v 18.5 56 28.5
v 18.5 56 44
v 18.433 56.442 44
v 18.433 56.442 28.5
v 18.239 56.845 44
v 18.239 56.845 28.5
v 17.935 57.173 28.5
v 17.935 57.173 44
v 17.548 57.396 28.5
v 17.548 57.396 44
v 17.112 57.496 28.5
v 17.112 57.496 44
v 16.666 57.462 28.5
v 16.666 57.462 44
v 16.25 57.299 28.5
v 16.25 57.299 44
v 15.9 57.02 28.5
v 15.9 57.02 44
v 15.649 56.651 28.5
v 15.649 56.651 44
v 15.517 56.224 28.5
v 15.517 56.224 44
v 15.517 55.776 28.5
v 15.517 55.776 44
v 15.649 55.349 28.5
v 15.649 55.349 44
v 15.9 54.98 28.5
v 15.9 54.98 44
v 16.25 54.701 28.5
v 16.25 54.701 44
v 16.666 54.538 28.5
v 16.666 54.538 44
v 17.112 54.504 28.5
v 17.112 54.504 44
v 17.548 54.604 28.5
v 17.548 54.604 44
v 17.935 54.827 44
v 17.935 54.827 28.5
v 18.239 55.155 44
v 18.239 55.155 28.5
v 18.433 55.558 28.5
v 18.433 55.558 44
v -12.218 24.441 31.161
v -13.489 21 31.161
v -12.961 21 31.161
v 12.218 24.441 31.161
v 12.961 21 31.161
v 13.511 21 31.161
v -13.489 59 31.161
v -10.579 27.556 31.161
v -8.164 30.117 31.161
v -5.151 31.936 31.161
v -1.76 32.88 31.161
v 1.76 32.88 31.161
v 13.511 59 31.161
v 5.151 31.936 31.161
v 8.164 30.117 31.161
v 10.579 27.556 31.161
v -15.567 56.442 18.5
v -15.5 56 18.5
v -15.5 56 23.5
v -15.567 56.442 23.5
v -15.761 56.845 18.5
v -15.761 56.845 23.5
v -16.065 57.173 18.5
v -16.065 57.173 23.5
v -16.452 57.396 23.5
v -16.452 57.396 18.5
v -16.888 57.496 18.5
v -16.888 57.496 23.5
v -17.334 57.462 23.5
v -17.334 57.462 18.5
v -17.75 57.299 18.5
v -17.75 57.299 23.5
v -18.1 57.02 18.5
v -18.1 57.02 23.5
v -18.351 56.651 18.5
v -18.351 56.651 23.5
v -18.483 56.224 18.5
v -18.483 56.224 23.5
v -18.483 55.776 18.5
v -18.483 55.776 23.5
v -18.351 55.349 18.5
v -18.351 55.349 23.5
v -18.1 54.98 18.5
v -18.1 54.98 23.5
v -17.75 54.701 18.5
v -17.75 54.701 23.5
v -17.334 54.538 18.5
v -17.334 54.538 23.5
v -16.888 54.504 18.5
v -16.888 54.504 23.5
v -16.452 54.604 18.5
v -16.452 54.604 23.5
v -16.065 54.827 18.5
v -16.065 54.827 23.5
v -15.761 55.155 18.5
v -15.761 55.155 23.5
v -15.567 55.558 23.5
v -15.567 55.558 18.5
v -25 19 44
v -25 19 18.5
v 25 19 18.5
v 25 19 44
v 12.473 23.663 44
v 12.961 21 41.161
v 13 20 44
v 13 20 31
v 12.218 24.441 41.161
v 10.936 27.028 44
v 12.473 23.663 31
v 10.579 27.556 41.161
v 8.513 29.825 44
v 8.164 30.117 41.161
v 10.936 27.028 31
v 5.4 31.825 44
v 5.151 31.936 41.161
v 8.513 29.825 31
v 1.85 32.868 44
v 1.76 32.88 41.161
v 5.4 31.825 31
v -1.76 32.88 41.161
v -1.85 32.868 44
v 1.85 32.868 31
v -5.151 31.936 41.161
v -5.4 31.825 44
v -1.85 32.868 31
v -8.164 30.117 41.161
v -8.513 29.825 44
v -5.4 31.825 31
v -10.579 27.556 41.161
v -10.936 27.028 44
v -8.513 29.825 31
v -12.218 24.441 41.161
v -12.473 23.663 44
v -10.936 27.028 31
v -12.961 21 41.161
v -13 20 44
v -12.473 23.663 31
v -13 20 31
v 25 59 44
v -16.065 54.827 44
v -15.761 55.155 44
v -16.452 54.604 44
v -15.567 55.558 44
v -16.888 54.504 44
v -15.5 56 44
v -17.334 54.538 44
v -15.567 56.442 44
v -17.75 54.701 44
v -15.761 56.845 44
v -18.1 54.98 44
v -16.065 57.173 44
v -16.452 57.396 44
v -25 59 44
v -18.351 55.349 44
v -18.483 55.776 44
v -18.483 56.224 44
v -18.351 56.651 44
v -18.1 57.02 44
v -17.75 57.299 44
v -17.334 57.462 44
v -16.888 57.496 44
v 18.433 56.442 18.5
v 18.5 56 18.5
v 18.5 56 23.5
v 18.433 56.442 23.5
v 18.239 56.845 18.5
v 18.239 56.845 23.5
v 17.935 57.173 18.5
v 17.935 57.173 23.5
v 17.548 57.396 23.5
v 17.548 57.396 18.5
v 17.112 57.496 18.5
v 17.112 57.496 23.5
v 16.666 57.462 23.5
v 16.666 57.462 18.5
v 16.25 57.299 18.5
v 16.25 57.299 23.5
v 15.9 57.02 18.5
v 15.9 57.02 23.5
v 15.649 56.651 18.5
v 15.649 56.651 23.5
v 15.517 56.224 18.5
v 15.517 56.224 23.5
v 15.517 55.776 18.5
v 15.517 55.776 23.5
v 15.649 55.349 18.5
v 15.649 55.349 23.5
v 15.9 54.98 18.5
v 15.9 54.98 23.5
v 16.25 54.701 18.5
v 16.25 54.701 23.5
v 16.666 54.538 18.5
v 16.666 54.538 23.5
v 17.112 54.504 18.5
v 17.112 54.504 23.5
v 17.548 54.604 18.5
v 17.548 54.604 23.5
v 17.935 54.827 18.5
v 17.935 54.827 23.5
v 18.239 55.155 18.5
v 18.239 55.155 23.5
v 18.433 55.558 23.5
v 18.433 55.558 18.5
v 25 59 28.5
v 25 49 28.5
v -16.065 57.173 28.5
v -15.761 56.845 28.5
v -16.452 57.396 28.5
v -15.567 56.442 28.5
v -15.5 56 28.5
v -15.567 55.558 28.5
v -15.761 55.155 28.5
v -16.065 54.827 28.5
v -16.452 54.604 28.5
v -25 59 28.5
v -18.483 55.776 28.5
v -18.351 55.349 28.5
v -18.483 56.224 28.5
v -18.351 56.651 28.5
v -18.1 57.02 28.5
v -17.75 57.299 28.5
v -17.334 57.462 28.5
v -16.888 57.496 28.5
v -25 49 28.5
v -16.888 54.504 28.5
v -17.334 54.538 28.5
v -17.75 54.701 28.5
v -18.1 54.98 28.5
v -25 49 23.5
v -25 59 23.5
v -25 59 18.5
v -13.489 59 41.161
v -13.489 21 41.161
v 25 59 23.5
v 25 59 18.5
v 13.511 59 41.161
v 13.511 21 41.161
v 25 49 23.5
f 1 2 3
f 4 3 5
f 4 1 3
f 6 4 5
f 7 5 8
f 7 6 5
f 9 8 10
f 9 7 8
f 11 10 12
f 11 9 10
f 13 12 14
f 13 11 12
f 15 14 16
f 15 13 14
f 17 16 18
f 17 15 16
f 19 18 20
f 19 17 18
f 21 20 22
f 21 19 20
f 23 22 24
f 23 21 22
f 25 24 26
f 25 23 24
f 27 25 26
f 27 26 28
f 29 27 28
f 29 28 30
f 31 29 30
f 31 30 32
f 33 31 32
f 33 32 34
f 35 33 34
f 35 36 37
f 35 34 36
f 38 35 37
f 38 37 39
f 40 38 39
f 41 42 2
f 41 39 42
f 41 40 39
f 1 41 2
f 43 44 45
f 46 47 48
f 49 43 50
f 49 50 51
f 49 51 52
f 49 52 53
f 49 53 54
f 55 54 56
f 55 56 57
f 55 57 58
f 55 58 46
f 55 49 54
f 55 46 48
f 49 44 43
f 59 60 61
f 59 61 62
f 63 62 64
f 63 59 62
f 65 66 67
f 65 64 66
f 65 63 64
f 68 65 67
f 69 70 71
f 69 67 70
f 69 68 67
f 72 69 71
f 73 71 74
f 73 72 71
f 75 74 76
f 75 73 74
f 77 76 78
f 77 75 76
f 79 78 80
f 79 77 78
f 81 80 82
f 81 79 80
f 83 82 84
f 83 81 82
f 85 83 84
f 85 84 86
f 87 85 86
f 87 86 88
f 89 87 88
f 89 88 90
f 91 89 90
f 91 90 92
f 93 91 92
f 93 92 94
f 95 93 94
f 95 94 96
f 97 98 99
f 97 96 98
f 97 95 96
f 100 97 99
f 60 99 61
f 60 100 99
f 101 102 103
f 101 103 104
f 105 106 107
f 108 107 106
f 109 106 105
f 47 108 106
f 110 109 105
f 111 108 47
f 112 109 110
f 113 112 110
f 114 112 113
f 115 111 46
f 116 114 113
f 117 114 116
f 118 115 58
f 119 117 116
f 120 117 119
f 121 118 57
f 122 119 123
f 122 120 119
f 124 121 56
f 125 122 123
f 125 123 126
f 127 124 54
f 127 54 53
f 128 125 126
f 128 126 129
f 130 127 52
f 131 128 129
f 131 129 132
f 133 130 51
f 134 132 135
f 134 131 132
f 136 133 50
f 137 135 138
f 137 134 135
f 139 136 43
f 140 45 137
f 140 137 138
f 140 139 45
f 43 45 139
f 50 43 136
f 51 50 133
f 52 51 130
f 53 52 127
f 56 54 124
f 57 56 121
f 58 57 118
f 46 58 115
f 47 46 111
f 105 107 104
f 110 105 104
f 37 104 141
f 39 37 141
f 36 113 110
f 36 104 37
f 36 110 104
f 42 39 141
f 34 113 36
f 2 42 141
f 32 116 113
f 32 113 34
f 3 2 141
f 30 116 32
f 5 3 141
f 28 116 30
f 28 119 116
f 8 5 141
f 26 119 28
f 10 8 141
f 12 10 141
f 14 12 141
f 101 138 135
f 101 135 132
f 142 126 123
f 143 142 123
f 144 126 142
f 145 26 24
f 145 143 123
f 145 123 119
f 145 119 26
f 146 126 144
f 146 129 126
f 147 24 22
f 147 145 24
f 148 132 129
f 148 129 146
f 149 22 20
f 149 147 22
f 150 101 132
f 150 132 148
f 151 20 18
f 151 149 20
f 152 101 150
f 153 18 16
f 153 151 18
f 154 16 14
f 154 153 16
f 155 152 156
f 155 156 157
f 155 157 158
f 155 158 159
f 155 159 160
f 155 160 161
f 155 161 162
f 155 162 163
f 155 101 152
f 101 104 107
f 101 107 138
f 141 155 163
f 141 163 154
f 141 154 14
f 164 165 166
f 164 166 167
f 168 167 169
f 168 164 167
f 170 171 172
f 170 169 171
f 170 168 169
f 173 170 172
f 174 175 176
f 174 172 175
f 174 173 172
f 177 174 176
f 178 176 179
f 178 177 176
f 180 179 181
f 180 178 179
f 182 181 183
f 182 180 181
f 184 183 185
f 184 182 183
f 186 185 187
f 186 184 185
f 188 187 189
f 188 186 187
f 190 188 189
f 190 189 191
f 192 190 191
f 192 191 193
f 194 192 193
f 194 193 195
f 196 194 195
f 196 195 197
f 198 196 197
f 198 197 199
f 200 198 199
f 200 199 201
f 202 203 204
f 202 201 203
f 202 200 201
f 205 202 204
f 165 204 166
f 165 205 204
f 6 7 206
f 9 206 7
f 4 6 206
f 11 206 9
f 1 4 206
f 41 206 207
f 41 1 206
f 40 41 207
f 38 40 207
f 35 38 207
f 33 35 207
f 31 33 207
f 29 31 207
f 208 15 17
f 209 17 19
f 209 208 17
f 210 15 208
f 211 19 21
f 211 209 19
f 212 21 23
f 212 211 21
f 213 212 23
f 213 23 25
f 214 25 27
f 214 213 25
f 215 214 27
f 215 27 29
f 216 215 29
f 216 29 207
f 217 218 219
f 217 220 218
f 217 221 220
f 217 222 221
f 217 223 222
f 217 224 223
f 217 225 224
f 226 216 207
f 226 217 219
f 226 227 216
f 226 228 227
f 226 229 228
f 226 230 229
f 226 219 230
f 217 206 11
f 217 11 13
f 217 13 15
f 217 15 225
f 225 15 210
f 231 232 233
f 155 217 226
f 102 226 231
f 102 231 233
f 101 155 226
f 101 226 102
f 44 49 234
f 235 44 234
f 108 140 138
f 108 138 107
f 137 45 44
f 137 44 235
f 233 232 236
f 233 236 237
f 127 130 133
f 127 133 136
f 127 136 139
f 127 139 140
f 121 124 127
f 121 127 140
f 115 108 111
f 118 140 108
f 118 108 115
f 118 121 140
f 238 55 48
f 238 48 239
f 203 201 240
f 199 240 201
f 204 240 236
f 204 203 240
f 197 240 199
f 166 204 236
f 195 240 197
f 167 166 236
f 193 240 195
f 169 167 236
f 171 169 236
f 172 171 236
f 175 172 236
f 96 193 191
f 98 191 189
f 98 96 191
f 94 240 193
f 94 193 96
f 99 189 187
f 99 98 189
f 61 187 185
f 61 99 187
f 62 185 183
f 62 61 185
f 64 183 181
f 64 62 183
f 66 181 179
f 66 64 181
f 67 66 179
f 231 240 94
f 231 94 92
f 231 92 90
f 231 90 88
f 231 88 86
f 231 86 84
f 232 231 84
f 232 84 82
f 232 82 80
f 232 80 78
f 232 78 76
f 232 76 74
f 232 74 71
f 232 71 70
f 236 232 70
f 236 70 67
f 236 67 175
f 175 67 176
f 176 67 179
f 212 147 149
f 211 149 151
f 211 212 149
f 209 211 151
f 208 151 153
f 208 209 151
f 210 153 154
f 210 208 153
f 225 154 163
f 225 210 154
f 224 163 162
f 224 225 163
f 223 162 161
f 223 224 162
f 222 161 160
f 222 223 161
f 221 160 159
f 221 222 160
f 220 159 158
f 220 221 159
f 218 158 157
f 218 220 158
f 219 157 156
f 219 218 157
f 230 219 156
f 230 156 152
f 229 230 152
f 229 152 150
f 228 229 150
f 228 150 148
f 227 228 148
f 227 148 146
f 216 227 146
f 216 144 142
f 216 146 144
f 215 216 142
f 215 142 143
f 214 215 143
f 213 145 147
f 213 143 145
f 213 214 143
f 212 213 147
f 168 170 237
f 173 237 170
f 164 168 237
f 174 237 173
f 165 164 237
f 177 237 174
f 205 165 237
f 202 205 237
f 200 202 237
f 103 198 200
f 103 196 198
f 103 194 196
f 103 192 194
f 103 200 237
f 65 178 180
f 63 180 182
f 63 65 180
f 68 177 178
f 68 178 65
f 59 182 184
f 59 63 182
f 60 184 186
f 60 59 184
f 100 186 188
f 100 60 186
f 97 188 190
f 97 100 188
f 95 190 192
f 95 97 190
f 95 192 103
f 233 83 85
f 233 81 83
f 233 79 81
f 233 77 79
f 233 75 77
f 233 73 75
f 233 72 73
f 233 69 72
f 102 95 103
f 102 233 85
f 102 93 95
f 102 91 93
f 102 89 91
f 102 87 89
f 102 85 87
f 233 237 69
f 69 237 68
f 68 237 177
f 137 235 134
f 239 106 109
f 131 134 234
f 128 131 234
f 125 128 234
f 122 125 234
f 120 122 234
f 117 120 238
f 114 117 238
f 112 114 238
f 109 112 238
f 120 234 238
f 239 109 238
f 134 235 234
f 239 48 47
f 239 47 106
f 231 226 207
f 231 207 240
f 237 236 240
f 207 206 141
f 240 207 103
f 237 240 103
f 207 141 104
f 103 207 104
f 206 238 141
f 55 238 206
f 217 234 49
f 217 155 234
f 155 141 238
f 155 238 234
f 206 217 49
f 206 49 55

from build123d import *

# Parameters (mm, degrees)
BOX002_W          = 36
BOX002_H          = 16
BOX002_DEPTH      = 41
CYLINDER035_R     = 13
CYLINDER035_DEPTH = 24
CYLINDER003_R     = 1.5
CYLINDER003_DEPTH = 44
CYLINDER002_R     = 1.5
CYLINDER002_DEPTH = 44
PAD009_DEPTH      = 50
SKETCH026_W       = 10
SKETCH026_H       = 27
POCKET006_DEPTH   = 38


with BuildPart() as cubo002:
    # Box002 → Box002 (new body)
    with BuildSketch(Plane(origin=(-19, 1, 45), x_dir=(1, 0, 0), z_dir=(0, 0, 1))):
        with Locations((18, 8)):
            Rectangle(BOX002_W, BOX002_H)
    extrude(amount=BOX002_DEPTH)


with BuildPart() as cut013020:
    # Cylinder035 → Cylinder035 (new body)
    with BuildSketch(Plane(origin=(0, 17, 45), x_dir=(1, 0, 0), z_dir=(0, 0, 1))):
        Circle(CYLINDER035_R)
    extrude(amount=CYLINDER035_DEPTH)

    # Cut013020: cut Cubo002
    add(cubo002.part, mode=Mode.SUBTRACT)


with BuildPart() as cut013020_1:
    # Cut013020 placement: moved
    add(cut013020.part.moved(Location((0, 3, -14))))


with BuildPart() as cilindro003:
    # Cylinder003 → Cylinder003 (new body)
    with BuildSketch(Plane(origin=(17, 63, -20), x_dir=(1, 0, 0), z_dir=(0, 0, 1))):
        Circle(CYLINDER003_R)
    extrude(amount=CYLINDER003_DEPTH)


with BuildPart() as fusion001009:
    # Cylinder002 → Cylinder002 (new body)
    with BuildSketch(Plane(origin=(-17, 63, -22), x_dir=(1, 0, 0), z_dir=(0, 0, 1))):
        Circle(CYLINDER002_R)
    extrude(amount=CYLINDER002_DEPTH)

    # Fusion001009: union Cilindro003
    add(cilindro003.part)


with BuildPart() as fusion001009_1:
    # Fusion001009 placement: moved
    add(fusion001009.part.moved(Location((0, -15, 0))))


with BuildPart() as cut013021:
    # Sketch014 → Pad009 (new body)
    with BuildSketch(Plane.YZ):
        Polygon((-20, -7.5), (-20, 18), (20, 18), (20, 2.5), (10, 2.5), (10, -2.5), (20, -2.5), (20, -7.5), align=None)
    extrude(amount=PAD009_DEPTH)

    # Sketch026 (on Face3 of Pad009) → Pocket006 (cut)
    with BuildSketch(Plane.ZX.offset(20)):
        with Locations((10.160879, 25.010977)):
            Rectangle(SKETCH026_W, SKETCH026_H)
    extrude(amount=-POCKET006_DEPTH, mode=Mode.SUBTRACT)


with BuildPart() as cut013021_1:
    # Body013 placement: moved
    add(cut013021.part.moved(Location((-25, 31, -5))))

    # Cut013018: cut Fusion001009
    add(fusion001009_1.part, mode=Mode.SUBTRACT)


with BuildPart() as cut013021_2:
    # Cut013018 placement: moved
    add(cut013021_1.part.moved(Location((0, 8, 31))))

    # Cut013021: cut Cut013020
    add(cut013020_1.part, mode=Mode.SUBTRACT)


solid = cut013021_2.part
